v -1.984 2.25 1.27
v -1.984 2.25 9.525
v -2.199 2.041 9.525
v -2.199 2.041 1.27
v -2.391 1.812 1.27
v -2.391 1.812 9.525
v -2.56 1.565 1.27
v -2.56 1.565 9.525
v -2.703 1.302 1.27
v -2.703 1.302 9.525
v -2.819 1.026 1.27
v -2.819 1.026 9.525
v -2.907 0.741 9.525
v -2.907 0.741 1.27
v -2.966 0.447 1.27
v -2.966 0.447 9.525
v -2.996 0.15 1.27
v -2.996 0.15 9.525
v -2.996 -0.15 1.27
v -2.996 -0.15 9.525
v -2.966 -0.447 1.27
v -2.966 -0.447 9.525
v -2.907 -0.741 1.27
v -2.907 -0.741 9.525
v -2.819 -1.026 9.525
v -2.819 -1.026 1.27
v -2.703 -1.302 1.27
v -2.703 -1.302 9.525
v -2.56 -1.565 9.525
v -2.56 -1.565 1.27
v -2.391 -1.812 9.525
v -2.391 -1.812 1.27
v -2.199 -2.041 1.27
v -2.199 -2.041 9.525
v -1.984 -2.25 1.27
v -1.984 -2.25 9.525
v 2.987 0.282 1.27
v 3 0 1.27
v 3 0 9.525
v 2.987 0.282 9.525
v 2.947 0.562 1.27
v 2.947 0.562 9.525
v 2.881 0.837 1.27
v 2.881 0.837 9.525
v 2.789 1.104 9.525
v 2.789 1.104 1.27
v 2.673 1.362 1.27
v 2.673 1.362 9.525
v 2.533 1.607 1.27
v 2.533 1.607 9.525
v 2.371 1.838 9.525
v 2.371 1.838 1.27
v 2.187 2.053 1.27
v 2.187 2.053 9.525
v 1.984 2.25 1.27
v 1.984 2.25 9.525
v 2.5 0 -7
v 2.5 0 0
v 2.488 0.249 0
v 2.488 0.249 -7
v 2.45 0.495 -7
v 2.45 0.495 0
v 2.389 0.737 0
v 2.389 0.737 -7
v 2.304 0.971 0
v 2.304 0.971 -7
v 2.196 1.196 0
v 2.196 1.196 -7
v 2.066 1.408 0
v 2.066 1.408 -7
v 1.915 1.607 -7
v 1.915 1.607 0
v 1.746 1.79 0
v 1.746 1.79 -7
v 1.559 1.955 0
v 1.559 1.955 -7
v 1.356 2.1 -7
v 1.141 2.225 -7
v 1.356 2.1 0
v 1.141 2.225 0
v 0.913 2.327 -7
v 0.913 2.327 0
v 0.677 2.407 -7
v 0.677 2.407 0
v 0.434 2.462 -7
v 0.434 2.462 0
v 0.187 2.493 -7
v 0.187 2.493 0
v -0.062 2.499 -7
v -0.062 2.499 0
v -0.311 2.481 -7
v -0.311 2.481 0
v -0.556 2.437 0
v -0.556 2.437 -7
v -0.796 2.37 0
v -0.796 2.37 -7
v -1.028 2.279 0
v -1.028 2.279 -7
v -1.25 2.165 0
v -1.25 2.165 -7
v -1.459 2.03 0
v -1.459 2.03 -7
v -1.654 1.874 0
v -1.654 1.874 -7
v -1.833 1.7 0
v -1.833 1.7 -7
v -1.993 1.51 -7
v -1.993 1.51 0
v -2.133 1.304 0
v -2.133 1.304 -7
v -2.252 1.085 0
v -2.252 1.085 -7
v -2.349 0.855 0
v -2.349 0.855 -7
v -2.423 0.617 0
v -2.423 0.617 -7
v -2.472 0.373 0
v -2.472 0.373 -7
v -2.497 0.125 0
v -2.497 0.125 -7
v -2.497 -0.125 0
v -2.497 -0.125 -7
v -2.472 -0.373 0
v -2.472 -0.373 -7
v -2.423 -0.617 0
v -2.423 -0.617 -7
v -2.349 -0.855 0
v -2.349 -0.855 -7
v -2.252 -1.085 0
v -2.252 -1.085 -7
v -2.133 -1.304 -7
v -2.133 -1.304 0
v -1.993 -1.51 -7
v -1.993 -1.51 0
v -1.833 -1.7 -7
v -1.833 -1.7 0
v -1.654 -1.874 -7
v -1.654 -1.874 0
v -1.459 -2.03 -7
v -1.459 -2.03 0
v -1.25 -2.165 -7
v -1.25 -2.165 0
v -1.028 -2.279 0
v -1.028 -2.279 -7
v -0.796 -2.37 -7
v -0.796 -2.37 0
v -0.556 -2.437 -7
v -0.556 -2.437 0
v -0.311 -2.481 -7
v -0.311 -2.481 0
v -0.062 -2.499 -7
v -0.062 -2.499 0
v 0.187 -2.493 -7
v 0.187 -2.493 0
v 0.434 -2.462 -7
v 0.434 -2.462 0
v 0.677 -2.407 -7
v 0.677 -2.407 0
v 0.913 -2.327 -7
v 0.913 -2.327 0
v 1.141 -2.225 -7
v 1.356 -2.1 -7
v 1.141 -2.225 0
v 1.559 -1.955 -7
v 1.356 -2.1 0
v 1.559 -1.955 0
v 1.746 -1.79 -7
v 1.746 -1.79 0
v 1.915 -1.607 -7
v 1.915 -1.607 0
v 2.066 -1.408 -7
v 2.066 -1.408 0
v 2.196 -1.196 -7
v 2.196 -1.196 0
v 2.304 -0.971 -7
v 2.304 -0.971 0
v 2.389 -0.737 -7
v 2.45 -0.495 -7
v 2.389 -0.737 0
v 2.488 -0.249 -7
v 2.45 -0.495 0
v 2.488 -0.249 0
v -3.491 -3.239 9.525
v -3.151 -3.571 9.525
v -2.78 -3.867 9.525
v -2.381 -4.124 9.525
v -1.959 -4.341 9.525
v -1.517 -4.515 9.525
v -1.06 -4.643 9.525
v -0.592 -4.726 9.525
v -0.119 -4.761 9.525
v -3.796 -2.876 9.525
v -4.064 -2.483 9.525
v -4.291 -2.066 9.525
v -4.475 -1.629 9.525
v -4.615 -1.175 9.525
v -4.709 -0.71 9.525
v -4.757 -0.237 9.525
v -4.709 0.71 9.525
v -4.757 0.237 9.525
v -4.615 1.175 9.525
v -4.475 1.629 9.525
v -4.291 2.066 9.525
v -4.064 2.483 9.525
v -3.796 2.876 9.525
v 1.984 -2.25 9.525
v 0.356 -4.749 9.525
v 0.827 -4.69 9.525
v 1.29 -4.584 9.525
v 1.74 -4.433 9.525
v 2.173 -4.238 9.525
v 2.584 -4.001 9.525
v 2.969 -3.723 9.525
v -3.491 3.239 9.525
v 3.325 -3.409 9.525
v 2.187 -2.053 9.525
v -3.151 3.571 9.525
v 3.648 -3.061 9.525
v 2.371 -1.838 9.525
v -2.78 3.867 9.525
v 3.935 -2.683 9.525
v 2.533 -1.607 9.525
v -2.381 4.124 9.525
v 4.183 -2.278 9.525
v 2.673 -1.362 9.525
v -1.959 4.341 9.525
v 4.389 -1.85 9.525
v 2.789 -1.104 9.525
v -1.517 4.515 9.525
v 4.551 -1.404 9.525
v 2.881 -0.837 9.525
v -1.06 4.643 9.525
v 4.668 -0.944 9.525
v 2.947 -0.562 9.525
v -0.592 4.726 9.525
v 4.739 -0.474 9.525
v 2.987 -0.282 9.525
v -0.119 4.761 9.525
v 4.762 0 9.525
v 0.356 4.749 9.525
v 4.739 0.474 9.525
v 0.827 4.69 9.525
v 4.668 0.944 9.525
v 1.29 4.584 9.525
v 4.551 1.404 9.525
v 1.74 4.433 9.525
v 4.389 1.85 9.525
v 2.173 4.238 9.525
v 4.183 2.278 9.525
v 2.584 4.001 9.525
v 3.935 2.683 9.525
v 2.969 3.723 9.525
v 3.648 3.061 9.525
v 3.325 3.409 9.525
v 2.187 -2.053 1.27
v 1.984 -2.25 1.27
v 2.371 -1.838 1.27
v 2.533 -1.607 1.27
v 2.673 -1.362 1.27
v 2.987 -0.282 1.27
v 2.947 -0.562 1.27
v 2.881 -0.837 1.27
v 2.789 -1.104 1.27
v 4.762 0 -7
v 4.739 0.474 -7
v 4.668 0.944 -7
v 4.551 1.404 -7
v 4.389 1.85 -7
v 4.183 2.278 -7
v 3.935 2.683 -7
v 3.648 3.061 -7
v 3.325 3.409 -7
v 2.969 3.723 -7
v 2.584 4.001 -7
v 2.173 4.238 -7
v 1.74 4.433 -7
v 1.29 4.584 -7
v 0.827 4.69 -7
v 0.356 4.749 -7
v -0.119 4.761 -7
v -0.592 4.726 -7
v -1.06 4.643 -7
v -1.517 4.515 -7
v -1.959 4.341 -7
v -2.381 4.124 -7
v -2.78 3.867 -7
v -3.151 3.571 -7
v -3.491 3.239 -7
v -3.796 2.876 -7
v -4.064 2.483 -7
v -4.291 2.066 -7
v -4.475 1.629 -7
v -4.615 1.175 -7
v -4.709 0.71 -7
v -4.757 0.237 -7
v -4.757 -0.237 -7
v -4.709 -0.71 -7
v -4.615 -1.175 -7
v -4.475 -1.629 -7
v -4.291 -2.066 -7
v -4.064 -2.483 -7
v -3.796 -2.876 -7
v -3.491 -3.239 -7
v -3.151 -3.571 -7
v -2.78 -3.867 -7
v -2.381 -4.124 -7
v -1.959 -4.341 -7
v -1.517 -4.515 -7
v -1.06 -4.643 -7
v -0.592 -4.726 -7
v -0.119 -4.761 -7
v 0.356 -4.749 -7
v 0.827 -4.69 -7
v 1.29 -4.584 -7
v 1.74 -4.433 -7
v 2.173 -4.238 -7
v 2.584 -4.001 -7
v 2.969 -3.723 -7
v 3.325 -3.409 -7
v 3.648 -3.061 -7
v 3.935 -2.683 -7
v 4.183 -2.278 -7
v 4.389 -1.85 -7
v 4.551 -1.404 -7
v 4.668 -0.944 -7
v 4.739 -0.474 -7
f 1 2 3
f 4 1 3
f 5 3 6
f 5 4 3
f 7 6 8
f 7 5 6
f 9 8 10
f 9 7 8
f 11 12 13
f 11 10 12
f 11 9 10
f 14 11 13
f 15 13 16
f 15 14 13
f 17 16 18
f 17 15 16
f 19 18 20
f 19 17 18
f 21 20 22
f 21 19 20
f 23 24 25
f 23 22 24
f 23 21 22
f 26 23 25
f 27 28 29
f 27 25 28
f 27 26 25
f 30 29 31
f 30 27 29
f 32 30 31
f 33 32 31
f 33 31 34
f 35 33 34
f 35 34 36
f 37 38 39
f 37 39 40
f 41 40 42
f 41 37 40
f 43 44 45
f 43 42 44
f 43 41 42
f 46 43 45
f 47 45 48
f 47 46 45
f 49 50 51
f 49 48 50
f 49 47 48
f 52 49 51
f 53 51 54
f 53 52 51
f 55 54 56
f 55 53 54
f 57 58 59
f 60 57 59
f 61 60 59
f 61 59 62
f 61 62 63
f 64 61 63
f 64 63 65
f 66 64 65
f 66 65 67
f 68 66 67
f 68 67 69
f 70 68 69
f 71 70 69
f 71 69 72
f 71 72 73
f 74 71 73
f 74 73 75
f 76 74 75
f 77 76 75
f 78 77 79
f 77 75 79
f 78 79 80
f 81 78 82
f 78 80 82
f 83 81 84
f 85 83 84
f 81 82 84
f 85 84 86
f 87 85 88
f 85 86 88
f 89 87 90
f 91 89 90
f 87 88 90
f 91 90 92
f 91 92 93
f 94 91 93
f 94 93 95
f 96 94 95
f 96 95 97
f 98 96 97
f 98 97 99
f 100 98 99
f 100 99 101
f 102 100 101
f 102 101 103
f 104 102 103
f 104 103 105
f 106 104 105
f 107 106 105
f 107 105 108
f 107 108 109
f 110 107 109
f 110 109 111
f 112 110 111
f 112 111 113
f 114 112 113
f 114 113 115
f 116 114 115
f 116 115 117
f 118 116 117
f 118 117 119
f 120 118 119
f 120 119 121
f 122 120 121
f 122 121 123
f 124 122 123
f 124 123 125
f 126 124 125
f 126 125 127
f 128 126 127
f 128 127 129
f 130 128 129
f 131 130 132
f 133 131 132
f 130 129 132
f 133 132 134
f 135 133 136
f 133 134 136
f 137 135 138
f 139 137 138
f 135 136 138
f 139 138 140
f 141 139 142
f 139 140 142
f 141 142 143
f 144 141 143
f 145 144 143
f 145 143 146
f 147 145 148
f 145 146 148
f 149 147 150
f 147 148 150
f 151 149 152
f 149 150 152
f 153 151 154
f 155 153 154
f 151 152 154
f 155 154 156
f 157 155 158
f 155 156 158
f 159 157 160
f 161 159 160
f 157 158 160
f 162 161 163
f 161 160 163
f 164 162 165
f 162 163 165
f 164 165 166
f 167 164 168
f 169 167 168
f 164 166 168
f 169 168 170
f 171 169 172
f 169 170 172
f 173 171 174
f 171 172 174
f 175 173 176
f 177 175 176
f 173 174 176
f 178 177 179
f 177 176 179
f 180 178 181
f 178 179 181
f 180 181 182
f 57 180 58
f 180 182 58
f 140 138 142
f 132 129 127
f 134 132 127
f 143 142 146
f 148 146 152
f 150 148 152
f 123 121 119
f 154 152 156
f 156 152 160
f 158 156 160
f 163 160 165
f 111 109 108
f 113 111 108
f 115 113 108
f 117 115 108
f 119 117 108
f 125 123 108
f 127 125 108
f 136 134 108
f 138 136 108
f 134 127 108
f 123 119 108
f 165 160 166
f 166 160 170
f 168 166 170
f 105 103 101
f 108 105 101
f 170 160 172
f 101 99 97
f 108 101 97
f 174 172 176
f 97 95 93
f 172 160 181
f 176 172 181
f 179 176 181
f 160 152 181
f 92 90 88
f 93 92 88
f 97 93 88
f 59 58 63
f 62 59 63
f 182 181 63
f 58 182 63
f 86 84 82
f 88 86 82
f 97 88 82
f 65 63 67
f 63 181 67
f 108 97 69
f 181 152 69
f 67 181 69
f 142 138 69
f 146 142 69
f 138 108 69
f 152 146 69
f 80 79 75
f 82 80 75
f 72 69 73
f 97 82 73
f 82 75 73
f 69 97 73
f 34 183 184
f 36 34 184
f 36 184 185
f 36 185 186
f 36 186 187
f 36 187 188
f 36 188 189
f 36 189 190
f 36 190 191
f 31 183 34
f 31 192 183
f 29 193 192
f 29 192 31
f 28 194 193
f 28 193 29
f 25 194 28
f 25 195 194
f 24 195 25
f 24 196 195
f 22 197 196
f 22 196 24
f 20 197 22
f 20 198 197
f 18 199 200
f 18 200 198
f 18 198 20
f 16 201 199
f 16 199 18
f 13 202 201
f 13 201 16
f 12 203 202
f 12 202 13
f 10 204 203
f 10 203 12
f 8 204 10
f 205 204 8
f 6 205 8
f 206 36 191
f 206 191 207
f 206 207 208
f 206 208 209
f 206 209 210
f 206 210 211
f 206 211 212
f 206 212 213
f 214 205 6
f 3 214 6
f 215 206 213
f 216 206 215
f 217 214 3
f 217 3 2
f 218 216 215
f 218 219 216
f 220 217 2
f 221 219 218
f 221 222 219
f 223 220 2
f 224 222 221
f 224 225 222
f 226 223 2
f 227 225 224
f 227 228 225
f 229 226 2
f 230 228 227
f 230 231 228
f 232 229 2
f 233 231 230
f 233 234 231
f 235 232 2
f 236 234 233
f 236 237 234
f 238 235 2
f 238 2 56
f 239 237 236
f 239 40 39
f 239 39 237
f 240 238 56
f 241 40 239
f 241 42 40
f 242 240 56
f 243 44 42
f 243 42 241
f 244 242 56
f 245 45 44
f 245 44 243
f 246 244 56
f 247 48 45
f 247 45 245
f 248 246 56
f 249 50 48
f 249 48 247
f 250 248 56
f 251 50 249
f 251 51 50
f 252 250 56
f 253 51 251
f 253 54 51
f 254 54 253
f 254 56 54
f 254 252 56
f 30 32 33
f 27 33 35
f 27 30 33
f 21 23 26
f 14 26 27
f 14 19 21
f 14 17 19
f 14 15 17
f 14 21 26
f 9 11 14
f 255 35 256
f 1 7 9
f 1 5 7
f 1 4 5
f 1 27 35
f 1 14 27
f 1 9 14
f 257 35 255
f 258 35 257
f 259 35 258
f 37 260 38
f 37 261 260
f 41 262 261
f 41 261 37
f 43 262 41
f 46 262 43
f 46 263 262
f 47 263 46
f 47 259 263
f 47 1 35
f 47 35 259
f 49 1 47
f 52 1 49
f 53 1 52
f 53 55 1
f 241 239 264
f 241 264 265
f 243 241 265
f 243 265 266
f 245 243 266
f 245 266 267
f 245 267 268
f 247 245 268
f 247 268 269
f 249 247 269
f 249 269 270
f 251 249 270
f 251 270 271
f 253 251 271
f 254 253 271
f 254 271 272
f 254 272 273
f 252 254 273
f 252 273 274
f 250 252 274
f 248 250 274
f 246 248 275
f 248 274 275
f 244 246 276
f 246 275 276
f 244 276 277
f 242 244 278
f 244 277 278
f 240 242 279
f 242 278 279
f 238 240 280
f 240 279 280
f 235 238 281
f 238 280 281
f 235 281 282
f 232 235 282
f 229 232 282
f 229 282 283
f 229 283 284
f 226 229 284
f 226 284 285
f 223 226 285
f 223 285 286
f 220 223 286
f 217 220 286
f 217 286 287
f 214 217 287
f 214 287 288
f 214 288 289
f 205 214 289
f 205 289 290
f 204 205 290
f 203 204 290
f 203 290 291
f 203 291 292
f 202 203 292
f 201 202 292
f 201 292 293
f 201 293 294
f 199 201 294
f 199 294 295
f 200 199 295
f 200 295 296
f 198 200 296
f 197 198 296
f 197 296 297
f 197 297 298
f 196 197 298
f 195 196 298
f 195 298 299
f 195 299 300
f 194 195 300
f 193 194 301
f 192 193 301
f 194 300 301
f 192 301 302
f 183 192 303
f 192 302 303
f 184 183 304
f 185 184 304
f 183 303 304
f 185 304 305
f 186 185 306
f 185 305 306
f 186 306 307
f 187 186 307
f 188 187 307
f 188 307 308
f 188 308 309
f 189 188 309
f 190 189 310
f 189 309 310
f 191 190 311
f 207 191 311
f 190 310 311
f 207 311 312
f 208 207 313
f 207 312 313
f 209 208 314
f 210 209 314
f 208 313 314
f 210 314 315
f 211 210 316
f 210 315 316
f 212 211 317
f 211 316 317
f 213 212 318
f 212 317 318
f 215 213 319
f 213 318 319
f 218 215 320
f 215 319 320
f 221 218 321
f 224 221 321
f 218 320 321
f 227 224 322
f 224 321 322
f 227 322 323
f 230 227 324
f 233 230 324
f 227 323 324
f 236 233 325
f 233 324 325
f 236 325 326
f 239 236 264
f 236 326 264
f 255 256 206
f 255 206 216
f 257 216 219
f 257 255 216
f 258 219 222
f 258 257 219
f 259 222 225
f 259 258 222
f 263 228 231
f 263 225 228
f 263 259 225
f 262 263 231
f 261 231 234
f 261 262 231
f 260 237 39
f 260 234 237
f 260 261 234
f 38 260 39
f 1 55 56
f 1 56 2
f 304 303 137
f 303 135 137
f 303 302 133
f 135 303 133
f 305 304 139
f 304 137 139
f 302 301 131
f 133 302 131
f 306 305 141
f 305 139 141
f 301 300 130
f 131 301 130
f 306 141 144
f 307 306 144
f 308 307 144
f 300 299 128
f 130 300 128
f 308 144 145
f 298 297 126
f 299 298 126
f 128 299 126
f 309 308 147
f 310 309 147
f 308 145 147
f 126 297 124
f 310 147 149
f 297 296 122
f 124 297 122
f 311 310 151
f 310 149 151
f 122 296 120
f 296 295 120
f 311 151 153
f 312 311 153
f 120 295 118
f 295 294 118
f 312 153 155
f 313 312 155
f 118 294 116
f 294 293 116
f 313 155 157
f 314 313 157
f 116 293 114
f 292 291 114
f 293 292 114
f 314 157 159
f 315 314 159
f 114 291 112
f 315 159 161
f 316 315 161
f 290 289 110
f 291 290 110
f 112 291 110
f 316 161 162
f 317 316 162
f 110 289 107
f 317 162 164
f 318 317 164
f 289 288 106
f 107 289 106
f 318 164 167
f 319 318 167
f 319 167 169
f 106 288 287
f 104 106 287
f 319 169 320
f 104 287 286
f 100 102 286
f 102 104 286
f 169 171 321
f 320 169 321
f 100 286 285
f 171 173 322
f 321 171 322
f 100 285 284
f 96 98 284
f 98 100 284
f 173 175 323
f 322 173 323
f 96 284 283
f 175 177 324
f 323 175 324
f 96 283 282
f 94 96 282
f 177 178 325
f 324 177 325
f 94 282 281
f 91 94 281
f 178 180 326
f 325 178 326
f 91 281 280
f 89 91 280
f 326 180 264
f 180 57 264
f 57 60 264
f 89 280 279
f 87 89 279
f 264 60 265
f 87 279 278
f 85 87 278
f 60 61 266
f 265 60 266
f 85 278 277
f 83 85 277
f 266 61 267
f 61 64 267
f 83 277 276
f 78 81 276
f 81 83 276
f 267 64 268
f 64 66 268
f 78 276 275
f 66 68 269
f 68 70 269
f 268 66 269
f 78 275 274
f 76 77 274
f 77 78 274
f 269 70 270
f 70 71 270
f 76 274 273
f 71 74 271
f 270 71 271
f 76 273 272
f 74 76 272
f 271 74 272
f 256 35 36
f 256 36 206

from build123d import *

# Parameters (mm, degrees)
F0_R          = 4.7625
F1_DEPTH      = 9.525
F1_DEPTH_BACK = 7
F4_DEPTH      = 9.526
F3_R          = 2.5
F5_DEPTH      = 7.001
F6_DEPTH      = 1.27


with BuildPart() as f1:
    # F0 (on Top) → F1 (new body, two sides)
    with BuildSketch(Plane.XY) as f1_sk:
        Circle(F0_R)
    extrude(amount=F1_DEPTH)
    extrude(f1_sk.sketch, amount=-F1_DEPTH_BACK)

    # F2 (on Top) → F4 (cut, through all)
    with BuildSketch(Plane.XY):
        with BuildLine():
            ThreePointArc((1.984313, -2.25), (2.734313, -1.234313), (3, 0))
            ThreePointArc((3, 0), (2.734313, 1.234313), (1.984313, 2.25))
            Line((1.984313, 2.25), (-1.984313, 2.25))
            ThreePointArc((-1.984313, 2.25), (-3, 0), (-1.984313, -2.25))
            Line((-1.984313, -2.25), (1.984313, -2.25))
        make_face()
    extrude(amount=F4_DEPTH, mode=Mode.SUBTRACT)

    # F3 (on Top) → F5 (cut, through all)
    with BuildSketch(Plane.XY):
        Circle(F3_R)
    extrude(amount=-F5_DEPTH, mode=Mode.SUBTRACT)

    # F0 (on Top) → F6 (join)
    with BuildSketch(Plane.XY):
        Circle(F0_R)
    extrude(amount=F6_DEPTH)


solid = f1.part
